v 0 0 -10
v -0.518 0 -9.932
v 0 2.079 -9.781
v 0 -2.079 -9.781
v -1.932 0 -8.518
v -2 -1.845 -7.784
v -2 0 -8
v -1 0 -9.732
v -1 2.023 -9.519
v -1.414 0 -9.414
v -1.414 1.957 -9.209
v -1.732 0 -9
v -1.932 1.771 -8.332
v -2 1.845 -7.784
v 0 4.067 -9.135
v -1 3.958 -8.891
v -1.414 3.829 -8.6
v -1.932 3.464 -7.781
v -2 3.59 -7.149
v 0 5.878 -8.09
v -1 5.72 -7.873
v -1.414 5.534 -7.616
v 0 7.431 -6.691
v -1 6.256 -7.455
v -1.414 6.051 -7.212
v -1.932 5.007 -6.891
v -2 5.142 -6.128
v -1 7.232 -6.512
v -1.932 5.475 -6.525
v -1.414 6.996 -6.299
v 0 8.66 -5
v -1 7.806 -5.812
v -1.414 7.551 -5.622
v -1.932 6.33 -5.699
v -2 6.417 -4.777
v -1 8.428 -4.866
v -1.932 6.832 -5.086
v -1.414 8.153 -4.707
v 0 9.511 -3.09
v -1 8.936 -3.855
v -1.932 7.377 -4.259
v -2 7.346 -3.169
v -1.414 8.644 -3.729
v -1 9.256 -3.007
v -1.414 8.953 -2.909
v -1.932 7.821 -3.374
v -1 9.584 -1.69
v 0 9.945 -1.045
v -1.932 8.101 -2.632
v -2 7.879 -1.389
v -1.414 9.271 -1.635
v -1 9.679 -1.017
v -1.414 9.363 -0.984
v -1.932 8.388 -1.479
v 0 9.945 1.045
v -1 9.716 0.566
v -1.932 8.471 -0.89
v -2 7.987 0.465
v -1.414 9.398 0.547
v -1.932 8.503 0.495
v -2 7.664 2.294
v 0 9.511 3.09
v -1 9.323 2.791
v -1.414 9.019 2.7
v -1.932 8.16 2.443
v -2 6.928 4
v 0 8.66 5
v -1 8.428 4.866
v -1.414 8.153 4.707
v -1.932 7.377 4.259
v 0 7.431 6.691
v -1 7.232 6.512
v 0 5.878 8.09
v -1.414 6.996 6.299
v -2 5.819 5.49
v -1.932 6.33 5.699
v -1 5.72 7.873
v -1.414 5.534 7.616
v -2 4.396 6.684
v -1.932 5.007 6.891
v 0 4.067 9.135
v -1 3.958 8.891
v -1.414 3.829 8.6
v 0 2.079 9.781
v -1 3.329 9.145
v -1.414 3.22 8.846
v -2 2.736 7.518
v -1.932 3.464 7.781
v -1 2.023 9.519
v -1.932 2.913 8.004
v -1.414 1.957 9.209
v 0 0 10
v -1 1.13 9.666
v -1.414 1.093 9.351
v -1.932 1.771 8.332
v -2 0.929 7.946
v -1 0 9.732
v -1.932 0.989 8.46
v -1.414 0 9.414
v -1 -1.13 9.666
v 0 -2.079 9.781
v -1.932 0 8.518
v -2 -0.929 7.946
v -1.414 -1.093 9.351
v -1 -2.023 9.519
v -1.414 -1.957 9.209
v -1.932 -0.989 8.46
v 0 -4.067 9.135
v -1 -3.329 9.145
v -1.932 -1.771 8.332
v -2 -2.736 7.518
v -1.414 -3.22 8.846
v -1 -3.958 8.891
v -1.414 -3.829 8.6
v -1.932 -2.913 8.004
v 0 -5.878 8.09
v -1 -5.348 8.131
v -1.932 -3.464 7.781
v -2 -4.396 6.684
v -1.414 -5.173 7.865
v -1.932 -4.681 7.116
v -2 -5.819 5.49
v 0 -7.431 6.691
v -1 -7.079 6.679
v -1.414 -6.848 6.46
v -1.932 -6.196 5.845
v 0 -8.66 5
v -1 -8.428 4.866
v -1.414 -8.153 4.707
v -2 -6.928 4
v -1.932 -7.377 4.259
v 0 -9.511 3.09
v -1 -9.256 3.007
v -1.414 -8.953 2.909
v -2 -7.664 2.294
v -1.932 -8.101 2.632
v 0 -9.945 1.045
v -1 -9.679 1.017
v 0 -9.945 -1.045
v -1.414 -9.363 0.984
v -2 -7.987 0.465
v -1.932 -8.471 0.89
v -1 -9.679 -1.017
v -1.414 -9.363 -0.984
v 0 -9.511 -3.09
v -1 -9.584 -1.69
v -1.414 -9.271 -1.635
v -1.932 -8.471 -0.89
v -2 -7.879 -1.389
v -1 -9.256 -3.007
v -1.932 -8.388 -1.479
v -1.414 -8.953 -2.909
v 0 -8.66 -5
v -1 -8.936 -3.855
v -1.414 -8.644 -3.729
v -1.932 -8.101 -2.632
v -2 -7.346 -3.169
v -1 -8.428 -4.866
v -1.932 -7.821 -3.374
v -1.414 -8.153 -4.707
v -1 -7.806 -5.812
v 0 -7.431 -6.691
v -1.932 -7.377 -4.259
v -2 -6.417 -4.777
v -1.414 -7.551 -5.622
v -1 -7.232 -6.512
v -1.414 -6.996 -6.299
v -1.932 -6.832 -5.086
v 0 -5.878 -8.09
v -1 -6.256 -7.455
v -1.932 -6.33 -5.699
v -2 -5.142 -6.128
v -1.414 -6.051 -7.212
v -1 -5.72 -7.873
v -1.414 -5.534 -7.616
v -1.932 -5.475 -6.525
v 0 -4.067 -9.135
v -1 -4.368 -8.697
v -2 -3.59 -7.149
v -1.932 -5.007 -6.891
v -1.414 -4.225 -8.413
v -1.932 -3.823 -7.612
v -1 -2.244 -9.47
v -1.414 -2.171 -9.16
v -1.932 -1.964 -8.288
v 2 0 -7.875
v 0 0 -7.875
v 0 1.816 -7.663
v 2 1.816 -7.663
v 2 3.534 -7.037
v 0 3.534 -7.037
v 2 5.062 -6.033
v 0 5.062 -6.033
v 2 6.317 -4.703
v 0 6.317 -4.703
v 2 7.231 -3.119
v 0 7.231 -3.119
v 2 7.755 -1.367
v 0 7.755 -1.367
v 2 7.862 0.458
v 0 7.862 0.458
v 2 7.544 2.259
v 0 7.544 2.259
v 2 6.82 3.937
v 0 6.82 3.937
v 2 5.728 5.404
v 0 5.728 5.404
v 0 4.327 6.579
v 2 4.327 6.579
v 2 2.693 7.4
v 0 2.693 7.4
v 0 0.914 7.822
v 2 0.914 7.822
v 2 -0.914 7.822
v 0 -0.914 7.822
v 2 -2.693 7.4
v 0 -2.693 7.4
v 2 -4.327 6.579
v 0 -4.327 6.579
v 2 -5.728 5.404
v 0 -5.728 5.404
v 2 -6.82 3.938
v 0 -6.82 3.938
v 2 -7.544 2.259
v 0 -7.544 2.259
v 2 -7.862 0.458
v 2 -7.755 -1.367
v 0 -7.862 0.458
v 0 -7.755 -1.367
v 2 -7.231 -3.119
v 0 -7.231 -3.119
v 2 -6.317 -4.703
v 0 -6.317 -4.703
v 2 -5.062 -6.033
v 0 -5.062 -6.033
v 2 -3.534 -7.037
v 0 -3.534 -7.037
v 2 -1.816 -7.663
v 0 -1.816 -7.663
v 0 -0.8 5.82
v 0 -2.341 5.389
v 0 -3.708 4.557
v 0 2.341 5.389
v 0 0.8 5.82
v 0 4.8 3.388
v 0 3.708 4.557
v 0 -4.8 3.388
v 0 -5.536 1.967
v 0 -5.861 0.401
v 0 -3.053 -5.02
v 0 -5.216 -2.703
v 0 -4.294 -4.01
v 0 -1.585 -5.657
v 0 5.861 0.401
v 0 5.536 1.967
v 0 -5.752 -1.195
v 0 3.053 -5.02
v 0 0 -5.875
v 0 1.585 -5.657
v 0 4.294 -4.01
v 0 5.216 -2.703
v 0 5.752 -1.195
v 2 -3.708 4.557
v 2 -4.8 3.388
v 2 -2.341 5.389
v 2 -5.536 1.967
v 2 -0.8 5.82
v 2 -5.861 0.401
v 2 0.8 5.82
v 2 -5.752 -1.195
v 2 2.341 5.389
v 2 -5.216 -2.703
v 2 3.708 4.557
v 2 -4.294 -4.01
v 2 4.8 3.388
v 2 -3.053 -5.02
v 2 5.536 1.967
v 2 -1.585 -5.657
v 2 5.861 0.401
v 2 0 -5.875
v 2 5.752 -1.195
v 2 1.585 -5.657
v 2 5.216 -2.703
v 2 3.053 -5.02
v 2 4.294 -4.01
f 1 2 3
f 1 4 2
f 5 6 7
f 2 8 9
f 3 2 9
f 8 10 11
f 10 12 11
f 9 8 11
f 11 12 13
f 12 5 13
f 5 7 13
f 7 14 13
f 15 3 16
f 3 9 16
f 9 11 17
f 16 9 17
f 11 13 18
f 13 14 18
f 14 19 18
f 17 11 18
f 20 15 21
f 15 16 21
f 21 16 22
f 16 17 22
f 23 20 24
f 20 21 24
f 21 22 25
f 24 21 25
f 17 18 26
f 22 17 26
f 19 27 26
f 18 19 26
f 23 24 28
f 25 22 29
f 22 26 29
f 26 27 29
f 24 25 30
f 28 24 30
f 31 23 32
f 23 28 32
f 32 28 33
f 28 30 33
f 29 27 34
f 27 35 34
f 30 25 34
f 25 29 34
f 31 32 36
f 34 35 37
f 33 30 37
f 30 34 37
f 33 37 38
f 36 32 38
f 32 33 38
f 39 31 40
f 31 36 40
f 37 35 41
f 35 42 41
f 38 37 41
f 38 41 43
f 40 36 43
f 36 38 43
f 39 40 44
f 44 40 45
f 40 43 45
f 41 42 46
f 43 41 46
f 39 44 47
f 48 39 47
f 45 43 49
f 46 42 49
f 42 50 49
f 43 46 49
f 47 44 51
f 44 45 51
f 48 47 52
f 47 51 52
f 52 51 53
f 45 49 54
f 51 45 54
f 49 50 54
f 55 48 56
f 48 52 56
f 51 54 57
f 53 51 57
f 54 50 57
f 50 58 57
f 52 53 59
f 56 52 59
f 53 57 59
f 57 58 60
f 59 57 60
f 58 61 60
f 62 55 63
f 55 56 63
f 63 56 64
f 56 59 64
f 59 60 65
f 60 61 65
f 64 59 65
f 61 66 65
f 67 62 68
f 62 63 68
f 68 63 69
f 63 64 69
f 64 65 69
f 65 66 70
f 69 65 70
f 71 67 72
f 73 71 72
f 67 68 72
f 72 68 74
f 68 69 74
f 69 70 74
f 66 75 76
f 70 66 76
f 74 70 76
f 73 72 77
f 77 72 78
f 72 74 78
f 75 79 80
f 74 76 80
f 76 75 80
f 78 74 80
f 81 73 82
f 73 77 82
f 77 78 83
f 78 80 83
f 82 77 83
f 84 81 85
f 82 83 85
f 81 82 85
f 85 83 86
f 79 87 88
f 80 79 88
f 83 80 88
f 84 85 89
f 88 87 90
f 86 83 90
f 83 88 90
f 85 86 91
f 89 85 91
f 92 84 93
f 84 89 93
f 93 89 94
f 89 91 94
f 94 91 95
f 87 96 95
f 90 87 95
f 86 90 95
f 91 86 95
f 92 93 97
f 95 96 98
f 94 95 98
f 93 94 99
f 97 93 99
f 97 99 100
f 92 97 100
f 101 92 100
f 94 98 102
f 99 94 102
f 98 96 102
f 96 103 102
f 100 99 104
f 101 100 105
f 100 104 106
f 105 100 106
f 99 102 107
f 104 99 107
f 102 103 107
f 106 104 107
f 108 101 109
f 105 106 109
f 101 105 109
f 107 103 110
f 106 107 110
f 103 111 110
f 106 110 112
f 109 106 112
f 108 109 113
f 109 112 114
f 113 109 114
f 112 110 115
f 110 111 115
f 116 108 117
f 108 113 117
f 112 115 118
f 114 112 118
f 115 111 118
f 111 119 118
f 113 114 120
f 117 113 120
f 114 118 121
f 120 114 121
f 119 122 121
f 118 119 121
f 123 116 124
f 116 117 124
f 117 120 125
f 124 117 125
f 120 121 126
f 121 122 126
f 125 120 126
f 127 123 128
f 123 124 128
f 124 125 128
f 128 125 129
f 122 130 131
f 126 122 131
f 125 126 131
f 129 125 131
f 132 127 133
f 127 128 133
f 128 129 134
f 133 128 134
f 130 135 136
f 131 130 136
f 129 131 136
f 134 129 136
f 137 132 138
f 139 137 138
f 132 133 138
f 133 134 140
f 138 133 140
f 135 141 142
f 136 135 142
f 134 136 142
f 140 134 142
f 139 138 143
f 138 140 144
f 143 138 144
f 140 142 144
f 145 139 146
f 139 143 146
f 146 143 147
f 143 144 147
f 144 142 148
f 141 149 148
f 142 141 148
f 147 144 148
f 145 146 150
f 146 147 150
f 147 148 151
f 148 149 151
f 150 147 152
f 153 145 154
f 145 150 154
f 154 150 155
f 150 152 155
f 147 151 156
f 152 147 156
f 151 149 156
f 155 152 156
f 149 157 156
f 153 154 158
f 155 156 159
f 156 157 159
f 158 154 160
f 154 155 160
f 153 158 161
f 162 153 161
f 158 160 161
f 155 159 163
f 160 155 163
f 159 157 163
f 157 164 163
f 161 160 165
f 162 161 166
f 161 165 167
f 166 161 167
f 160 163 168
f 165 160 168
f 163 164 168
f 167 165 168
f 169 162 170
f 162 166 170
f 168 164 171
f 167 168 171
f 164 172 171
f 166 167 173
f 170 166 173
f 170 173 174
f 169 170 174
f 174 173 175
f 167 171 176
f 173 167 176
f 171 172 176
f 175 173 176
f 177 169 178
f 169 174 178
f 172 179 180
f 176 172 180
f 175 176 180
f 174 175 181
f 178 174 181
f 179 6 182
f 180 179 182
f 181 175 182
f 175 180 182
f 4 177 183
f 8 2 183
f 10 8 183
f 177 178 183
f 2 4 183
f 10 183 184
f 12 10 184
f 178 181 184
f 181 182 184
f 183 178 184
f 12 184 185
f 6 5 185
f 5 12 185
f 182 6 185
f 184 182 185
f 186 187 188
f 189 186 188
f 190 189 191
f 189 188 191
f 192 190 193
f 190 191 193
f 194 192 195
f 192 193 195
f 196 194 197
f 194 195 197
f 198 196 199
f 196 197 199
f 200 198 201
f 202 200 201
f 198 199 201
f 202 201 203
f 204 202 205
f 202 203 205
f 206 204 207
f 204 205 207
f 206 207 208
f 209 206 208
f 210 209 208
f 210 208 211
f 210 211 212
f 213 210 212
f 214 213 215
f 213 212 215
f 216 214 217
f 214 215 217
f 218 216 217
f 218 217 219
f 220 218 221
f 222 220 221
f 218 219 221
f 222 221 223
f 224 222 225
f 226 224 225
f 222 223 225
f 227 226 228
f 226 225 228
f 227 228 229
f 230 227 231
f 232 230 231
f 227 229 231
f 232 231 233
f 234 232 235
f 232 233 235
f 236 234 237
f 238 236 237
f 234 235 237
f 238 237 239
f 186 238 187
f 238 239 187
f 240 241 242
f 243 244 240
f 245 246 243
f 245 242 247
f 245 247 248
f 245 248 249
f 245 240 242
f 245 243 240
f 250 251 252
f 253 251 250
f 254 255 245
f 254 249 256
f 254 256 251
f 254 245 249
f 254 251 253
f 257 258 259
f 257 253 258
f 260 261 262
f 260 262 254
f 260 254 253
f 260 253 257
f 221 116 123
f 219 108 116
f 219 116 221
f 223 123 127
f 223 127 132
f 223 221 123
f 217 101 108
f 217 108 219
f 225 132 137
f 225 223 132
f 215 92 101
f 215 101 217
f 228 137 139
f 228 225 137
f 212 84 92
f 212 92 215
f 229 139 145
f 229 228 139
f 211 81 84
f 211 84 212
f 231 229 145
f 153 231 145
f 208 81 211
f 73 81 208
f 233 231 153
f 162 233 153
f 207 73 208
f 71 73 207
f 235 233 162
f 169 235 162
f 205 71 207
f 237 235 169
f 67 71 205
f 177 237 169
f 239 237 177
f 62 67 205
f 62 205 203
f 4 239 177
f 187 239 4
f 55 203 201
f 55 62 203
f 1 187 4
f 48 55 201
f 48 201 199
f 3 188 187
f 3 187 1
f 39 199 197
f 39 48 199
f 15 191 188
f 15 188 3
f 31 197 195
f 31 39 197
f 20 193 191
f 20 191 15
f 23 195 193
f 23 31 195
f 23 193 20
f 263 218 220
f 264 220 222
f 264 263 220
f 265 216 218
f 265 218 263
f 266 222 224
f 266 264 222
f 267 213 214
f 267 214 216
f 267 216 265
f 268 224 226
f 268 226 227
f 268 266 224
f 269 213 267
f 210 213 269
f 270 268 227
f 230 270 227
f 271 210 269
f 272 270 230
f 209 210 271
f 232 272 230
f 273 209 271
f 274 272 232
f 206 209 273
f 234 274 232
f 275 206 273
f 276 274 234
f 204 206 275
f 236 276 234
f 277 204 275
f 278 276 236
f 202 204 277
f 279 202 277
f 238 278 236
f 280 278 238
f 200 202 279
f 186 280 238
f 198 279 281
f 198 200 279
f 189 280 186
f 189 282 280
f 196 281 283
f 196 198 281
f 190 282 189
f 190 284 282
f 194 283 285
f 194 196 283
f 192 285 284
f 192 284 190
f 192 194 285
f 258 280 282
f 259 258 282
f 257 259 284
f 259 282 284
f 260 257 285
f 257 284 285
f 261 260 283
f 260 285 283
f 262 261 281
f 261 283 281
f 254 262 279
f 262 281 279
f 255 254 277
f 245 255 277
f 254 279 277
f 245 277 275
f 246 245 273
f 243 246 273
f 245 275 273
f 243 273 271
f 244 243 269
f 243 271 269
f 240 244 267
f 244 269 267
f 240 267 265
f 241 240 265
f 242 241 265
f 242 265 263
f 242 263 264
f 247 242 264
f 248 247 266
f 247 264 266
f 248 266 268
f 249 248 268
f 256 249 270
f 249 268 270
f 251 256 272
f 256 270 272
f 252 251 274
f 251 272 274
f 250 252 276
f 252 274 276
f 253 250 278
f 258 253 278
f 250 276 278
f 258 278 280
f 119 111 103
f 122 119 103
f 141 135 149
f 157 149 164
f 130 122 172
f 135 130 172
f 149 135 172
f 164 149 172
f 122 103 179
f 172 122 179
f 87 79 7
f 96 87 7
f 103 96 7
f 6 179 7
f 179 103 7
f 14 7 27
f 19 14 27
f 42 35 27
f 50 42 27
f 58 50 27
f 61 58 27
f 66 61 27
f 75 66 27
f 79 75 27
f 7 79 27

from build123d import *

# Parameters (mm, degrees)
SKETCH1_R           = 7.875
BOSS_EXTRUDE1_DEPTH = 2
SKETCH1_3_R         = 10
BOSS_EXTRUDE2_DEPTH = 2
FILLET1_R           = 2
SKETCH2_R           = 5.875
CUT_EXTRUDE1_DEPTH  = 2


with BuildPart() as part:
    # Sketch1 → Boss-Extrude1 (new body)
    with BuildSketch(Plane(origin=(0, 0, 0), x_dir=(0, 0, -1), z_dir=(1, 0, 0))):
        Circle(SKETCH1_R)
    extrude(amount=BOSS_EXTRUDE1_DEPTH)

    # Sketch1<3> → Boss-Extrude2 (add)
    with BuildSketch(Plane(origin=(0, 0, 0), x_dir=(0, 0, -1), z_dir=(1, 0, 0))):
        Circle(SKETCH1_3_R)
    extrude(amount=-BOSS_EXTRUDE2_DEPTH)

    # Fillet1
    fillet1_edges = [part.edges().sort_by_distance(p)[0] for p in [
        (-2, 0, 10),
    ]]
    fillet(fillet1_edges, radius=FILLET1_R - 0.0001)  # a hair under: the kernel refuses the full size

    # Sketch2 → Cut-Extrude1 (cut)
    with BuildSketch(Plane(origin=(2, 0, 0), x_dir=(0, 0, -1), z_dir=(1, 0, 0))):
        Circle(SKETCH2_R)
    extrude(amount=-CUT_EXTRUDE1_DEPTH, mode=Mode.SUBTRACT)


solid = part.part
